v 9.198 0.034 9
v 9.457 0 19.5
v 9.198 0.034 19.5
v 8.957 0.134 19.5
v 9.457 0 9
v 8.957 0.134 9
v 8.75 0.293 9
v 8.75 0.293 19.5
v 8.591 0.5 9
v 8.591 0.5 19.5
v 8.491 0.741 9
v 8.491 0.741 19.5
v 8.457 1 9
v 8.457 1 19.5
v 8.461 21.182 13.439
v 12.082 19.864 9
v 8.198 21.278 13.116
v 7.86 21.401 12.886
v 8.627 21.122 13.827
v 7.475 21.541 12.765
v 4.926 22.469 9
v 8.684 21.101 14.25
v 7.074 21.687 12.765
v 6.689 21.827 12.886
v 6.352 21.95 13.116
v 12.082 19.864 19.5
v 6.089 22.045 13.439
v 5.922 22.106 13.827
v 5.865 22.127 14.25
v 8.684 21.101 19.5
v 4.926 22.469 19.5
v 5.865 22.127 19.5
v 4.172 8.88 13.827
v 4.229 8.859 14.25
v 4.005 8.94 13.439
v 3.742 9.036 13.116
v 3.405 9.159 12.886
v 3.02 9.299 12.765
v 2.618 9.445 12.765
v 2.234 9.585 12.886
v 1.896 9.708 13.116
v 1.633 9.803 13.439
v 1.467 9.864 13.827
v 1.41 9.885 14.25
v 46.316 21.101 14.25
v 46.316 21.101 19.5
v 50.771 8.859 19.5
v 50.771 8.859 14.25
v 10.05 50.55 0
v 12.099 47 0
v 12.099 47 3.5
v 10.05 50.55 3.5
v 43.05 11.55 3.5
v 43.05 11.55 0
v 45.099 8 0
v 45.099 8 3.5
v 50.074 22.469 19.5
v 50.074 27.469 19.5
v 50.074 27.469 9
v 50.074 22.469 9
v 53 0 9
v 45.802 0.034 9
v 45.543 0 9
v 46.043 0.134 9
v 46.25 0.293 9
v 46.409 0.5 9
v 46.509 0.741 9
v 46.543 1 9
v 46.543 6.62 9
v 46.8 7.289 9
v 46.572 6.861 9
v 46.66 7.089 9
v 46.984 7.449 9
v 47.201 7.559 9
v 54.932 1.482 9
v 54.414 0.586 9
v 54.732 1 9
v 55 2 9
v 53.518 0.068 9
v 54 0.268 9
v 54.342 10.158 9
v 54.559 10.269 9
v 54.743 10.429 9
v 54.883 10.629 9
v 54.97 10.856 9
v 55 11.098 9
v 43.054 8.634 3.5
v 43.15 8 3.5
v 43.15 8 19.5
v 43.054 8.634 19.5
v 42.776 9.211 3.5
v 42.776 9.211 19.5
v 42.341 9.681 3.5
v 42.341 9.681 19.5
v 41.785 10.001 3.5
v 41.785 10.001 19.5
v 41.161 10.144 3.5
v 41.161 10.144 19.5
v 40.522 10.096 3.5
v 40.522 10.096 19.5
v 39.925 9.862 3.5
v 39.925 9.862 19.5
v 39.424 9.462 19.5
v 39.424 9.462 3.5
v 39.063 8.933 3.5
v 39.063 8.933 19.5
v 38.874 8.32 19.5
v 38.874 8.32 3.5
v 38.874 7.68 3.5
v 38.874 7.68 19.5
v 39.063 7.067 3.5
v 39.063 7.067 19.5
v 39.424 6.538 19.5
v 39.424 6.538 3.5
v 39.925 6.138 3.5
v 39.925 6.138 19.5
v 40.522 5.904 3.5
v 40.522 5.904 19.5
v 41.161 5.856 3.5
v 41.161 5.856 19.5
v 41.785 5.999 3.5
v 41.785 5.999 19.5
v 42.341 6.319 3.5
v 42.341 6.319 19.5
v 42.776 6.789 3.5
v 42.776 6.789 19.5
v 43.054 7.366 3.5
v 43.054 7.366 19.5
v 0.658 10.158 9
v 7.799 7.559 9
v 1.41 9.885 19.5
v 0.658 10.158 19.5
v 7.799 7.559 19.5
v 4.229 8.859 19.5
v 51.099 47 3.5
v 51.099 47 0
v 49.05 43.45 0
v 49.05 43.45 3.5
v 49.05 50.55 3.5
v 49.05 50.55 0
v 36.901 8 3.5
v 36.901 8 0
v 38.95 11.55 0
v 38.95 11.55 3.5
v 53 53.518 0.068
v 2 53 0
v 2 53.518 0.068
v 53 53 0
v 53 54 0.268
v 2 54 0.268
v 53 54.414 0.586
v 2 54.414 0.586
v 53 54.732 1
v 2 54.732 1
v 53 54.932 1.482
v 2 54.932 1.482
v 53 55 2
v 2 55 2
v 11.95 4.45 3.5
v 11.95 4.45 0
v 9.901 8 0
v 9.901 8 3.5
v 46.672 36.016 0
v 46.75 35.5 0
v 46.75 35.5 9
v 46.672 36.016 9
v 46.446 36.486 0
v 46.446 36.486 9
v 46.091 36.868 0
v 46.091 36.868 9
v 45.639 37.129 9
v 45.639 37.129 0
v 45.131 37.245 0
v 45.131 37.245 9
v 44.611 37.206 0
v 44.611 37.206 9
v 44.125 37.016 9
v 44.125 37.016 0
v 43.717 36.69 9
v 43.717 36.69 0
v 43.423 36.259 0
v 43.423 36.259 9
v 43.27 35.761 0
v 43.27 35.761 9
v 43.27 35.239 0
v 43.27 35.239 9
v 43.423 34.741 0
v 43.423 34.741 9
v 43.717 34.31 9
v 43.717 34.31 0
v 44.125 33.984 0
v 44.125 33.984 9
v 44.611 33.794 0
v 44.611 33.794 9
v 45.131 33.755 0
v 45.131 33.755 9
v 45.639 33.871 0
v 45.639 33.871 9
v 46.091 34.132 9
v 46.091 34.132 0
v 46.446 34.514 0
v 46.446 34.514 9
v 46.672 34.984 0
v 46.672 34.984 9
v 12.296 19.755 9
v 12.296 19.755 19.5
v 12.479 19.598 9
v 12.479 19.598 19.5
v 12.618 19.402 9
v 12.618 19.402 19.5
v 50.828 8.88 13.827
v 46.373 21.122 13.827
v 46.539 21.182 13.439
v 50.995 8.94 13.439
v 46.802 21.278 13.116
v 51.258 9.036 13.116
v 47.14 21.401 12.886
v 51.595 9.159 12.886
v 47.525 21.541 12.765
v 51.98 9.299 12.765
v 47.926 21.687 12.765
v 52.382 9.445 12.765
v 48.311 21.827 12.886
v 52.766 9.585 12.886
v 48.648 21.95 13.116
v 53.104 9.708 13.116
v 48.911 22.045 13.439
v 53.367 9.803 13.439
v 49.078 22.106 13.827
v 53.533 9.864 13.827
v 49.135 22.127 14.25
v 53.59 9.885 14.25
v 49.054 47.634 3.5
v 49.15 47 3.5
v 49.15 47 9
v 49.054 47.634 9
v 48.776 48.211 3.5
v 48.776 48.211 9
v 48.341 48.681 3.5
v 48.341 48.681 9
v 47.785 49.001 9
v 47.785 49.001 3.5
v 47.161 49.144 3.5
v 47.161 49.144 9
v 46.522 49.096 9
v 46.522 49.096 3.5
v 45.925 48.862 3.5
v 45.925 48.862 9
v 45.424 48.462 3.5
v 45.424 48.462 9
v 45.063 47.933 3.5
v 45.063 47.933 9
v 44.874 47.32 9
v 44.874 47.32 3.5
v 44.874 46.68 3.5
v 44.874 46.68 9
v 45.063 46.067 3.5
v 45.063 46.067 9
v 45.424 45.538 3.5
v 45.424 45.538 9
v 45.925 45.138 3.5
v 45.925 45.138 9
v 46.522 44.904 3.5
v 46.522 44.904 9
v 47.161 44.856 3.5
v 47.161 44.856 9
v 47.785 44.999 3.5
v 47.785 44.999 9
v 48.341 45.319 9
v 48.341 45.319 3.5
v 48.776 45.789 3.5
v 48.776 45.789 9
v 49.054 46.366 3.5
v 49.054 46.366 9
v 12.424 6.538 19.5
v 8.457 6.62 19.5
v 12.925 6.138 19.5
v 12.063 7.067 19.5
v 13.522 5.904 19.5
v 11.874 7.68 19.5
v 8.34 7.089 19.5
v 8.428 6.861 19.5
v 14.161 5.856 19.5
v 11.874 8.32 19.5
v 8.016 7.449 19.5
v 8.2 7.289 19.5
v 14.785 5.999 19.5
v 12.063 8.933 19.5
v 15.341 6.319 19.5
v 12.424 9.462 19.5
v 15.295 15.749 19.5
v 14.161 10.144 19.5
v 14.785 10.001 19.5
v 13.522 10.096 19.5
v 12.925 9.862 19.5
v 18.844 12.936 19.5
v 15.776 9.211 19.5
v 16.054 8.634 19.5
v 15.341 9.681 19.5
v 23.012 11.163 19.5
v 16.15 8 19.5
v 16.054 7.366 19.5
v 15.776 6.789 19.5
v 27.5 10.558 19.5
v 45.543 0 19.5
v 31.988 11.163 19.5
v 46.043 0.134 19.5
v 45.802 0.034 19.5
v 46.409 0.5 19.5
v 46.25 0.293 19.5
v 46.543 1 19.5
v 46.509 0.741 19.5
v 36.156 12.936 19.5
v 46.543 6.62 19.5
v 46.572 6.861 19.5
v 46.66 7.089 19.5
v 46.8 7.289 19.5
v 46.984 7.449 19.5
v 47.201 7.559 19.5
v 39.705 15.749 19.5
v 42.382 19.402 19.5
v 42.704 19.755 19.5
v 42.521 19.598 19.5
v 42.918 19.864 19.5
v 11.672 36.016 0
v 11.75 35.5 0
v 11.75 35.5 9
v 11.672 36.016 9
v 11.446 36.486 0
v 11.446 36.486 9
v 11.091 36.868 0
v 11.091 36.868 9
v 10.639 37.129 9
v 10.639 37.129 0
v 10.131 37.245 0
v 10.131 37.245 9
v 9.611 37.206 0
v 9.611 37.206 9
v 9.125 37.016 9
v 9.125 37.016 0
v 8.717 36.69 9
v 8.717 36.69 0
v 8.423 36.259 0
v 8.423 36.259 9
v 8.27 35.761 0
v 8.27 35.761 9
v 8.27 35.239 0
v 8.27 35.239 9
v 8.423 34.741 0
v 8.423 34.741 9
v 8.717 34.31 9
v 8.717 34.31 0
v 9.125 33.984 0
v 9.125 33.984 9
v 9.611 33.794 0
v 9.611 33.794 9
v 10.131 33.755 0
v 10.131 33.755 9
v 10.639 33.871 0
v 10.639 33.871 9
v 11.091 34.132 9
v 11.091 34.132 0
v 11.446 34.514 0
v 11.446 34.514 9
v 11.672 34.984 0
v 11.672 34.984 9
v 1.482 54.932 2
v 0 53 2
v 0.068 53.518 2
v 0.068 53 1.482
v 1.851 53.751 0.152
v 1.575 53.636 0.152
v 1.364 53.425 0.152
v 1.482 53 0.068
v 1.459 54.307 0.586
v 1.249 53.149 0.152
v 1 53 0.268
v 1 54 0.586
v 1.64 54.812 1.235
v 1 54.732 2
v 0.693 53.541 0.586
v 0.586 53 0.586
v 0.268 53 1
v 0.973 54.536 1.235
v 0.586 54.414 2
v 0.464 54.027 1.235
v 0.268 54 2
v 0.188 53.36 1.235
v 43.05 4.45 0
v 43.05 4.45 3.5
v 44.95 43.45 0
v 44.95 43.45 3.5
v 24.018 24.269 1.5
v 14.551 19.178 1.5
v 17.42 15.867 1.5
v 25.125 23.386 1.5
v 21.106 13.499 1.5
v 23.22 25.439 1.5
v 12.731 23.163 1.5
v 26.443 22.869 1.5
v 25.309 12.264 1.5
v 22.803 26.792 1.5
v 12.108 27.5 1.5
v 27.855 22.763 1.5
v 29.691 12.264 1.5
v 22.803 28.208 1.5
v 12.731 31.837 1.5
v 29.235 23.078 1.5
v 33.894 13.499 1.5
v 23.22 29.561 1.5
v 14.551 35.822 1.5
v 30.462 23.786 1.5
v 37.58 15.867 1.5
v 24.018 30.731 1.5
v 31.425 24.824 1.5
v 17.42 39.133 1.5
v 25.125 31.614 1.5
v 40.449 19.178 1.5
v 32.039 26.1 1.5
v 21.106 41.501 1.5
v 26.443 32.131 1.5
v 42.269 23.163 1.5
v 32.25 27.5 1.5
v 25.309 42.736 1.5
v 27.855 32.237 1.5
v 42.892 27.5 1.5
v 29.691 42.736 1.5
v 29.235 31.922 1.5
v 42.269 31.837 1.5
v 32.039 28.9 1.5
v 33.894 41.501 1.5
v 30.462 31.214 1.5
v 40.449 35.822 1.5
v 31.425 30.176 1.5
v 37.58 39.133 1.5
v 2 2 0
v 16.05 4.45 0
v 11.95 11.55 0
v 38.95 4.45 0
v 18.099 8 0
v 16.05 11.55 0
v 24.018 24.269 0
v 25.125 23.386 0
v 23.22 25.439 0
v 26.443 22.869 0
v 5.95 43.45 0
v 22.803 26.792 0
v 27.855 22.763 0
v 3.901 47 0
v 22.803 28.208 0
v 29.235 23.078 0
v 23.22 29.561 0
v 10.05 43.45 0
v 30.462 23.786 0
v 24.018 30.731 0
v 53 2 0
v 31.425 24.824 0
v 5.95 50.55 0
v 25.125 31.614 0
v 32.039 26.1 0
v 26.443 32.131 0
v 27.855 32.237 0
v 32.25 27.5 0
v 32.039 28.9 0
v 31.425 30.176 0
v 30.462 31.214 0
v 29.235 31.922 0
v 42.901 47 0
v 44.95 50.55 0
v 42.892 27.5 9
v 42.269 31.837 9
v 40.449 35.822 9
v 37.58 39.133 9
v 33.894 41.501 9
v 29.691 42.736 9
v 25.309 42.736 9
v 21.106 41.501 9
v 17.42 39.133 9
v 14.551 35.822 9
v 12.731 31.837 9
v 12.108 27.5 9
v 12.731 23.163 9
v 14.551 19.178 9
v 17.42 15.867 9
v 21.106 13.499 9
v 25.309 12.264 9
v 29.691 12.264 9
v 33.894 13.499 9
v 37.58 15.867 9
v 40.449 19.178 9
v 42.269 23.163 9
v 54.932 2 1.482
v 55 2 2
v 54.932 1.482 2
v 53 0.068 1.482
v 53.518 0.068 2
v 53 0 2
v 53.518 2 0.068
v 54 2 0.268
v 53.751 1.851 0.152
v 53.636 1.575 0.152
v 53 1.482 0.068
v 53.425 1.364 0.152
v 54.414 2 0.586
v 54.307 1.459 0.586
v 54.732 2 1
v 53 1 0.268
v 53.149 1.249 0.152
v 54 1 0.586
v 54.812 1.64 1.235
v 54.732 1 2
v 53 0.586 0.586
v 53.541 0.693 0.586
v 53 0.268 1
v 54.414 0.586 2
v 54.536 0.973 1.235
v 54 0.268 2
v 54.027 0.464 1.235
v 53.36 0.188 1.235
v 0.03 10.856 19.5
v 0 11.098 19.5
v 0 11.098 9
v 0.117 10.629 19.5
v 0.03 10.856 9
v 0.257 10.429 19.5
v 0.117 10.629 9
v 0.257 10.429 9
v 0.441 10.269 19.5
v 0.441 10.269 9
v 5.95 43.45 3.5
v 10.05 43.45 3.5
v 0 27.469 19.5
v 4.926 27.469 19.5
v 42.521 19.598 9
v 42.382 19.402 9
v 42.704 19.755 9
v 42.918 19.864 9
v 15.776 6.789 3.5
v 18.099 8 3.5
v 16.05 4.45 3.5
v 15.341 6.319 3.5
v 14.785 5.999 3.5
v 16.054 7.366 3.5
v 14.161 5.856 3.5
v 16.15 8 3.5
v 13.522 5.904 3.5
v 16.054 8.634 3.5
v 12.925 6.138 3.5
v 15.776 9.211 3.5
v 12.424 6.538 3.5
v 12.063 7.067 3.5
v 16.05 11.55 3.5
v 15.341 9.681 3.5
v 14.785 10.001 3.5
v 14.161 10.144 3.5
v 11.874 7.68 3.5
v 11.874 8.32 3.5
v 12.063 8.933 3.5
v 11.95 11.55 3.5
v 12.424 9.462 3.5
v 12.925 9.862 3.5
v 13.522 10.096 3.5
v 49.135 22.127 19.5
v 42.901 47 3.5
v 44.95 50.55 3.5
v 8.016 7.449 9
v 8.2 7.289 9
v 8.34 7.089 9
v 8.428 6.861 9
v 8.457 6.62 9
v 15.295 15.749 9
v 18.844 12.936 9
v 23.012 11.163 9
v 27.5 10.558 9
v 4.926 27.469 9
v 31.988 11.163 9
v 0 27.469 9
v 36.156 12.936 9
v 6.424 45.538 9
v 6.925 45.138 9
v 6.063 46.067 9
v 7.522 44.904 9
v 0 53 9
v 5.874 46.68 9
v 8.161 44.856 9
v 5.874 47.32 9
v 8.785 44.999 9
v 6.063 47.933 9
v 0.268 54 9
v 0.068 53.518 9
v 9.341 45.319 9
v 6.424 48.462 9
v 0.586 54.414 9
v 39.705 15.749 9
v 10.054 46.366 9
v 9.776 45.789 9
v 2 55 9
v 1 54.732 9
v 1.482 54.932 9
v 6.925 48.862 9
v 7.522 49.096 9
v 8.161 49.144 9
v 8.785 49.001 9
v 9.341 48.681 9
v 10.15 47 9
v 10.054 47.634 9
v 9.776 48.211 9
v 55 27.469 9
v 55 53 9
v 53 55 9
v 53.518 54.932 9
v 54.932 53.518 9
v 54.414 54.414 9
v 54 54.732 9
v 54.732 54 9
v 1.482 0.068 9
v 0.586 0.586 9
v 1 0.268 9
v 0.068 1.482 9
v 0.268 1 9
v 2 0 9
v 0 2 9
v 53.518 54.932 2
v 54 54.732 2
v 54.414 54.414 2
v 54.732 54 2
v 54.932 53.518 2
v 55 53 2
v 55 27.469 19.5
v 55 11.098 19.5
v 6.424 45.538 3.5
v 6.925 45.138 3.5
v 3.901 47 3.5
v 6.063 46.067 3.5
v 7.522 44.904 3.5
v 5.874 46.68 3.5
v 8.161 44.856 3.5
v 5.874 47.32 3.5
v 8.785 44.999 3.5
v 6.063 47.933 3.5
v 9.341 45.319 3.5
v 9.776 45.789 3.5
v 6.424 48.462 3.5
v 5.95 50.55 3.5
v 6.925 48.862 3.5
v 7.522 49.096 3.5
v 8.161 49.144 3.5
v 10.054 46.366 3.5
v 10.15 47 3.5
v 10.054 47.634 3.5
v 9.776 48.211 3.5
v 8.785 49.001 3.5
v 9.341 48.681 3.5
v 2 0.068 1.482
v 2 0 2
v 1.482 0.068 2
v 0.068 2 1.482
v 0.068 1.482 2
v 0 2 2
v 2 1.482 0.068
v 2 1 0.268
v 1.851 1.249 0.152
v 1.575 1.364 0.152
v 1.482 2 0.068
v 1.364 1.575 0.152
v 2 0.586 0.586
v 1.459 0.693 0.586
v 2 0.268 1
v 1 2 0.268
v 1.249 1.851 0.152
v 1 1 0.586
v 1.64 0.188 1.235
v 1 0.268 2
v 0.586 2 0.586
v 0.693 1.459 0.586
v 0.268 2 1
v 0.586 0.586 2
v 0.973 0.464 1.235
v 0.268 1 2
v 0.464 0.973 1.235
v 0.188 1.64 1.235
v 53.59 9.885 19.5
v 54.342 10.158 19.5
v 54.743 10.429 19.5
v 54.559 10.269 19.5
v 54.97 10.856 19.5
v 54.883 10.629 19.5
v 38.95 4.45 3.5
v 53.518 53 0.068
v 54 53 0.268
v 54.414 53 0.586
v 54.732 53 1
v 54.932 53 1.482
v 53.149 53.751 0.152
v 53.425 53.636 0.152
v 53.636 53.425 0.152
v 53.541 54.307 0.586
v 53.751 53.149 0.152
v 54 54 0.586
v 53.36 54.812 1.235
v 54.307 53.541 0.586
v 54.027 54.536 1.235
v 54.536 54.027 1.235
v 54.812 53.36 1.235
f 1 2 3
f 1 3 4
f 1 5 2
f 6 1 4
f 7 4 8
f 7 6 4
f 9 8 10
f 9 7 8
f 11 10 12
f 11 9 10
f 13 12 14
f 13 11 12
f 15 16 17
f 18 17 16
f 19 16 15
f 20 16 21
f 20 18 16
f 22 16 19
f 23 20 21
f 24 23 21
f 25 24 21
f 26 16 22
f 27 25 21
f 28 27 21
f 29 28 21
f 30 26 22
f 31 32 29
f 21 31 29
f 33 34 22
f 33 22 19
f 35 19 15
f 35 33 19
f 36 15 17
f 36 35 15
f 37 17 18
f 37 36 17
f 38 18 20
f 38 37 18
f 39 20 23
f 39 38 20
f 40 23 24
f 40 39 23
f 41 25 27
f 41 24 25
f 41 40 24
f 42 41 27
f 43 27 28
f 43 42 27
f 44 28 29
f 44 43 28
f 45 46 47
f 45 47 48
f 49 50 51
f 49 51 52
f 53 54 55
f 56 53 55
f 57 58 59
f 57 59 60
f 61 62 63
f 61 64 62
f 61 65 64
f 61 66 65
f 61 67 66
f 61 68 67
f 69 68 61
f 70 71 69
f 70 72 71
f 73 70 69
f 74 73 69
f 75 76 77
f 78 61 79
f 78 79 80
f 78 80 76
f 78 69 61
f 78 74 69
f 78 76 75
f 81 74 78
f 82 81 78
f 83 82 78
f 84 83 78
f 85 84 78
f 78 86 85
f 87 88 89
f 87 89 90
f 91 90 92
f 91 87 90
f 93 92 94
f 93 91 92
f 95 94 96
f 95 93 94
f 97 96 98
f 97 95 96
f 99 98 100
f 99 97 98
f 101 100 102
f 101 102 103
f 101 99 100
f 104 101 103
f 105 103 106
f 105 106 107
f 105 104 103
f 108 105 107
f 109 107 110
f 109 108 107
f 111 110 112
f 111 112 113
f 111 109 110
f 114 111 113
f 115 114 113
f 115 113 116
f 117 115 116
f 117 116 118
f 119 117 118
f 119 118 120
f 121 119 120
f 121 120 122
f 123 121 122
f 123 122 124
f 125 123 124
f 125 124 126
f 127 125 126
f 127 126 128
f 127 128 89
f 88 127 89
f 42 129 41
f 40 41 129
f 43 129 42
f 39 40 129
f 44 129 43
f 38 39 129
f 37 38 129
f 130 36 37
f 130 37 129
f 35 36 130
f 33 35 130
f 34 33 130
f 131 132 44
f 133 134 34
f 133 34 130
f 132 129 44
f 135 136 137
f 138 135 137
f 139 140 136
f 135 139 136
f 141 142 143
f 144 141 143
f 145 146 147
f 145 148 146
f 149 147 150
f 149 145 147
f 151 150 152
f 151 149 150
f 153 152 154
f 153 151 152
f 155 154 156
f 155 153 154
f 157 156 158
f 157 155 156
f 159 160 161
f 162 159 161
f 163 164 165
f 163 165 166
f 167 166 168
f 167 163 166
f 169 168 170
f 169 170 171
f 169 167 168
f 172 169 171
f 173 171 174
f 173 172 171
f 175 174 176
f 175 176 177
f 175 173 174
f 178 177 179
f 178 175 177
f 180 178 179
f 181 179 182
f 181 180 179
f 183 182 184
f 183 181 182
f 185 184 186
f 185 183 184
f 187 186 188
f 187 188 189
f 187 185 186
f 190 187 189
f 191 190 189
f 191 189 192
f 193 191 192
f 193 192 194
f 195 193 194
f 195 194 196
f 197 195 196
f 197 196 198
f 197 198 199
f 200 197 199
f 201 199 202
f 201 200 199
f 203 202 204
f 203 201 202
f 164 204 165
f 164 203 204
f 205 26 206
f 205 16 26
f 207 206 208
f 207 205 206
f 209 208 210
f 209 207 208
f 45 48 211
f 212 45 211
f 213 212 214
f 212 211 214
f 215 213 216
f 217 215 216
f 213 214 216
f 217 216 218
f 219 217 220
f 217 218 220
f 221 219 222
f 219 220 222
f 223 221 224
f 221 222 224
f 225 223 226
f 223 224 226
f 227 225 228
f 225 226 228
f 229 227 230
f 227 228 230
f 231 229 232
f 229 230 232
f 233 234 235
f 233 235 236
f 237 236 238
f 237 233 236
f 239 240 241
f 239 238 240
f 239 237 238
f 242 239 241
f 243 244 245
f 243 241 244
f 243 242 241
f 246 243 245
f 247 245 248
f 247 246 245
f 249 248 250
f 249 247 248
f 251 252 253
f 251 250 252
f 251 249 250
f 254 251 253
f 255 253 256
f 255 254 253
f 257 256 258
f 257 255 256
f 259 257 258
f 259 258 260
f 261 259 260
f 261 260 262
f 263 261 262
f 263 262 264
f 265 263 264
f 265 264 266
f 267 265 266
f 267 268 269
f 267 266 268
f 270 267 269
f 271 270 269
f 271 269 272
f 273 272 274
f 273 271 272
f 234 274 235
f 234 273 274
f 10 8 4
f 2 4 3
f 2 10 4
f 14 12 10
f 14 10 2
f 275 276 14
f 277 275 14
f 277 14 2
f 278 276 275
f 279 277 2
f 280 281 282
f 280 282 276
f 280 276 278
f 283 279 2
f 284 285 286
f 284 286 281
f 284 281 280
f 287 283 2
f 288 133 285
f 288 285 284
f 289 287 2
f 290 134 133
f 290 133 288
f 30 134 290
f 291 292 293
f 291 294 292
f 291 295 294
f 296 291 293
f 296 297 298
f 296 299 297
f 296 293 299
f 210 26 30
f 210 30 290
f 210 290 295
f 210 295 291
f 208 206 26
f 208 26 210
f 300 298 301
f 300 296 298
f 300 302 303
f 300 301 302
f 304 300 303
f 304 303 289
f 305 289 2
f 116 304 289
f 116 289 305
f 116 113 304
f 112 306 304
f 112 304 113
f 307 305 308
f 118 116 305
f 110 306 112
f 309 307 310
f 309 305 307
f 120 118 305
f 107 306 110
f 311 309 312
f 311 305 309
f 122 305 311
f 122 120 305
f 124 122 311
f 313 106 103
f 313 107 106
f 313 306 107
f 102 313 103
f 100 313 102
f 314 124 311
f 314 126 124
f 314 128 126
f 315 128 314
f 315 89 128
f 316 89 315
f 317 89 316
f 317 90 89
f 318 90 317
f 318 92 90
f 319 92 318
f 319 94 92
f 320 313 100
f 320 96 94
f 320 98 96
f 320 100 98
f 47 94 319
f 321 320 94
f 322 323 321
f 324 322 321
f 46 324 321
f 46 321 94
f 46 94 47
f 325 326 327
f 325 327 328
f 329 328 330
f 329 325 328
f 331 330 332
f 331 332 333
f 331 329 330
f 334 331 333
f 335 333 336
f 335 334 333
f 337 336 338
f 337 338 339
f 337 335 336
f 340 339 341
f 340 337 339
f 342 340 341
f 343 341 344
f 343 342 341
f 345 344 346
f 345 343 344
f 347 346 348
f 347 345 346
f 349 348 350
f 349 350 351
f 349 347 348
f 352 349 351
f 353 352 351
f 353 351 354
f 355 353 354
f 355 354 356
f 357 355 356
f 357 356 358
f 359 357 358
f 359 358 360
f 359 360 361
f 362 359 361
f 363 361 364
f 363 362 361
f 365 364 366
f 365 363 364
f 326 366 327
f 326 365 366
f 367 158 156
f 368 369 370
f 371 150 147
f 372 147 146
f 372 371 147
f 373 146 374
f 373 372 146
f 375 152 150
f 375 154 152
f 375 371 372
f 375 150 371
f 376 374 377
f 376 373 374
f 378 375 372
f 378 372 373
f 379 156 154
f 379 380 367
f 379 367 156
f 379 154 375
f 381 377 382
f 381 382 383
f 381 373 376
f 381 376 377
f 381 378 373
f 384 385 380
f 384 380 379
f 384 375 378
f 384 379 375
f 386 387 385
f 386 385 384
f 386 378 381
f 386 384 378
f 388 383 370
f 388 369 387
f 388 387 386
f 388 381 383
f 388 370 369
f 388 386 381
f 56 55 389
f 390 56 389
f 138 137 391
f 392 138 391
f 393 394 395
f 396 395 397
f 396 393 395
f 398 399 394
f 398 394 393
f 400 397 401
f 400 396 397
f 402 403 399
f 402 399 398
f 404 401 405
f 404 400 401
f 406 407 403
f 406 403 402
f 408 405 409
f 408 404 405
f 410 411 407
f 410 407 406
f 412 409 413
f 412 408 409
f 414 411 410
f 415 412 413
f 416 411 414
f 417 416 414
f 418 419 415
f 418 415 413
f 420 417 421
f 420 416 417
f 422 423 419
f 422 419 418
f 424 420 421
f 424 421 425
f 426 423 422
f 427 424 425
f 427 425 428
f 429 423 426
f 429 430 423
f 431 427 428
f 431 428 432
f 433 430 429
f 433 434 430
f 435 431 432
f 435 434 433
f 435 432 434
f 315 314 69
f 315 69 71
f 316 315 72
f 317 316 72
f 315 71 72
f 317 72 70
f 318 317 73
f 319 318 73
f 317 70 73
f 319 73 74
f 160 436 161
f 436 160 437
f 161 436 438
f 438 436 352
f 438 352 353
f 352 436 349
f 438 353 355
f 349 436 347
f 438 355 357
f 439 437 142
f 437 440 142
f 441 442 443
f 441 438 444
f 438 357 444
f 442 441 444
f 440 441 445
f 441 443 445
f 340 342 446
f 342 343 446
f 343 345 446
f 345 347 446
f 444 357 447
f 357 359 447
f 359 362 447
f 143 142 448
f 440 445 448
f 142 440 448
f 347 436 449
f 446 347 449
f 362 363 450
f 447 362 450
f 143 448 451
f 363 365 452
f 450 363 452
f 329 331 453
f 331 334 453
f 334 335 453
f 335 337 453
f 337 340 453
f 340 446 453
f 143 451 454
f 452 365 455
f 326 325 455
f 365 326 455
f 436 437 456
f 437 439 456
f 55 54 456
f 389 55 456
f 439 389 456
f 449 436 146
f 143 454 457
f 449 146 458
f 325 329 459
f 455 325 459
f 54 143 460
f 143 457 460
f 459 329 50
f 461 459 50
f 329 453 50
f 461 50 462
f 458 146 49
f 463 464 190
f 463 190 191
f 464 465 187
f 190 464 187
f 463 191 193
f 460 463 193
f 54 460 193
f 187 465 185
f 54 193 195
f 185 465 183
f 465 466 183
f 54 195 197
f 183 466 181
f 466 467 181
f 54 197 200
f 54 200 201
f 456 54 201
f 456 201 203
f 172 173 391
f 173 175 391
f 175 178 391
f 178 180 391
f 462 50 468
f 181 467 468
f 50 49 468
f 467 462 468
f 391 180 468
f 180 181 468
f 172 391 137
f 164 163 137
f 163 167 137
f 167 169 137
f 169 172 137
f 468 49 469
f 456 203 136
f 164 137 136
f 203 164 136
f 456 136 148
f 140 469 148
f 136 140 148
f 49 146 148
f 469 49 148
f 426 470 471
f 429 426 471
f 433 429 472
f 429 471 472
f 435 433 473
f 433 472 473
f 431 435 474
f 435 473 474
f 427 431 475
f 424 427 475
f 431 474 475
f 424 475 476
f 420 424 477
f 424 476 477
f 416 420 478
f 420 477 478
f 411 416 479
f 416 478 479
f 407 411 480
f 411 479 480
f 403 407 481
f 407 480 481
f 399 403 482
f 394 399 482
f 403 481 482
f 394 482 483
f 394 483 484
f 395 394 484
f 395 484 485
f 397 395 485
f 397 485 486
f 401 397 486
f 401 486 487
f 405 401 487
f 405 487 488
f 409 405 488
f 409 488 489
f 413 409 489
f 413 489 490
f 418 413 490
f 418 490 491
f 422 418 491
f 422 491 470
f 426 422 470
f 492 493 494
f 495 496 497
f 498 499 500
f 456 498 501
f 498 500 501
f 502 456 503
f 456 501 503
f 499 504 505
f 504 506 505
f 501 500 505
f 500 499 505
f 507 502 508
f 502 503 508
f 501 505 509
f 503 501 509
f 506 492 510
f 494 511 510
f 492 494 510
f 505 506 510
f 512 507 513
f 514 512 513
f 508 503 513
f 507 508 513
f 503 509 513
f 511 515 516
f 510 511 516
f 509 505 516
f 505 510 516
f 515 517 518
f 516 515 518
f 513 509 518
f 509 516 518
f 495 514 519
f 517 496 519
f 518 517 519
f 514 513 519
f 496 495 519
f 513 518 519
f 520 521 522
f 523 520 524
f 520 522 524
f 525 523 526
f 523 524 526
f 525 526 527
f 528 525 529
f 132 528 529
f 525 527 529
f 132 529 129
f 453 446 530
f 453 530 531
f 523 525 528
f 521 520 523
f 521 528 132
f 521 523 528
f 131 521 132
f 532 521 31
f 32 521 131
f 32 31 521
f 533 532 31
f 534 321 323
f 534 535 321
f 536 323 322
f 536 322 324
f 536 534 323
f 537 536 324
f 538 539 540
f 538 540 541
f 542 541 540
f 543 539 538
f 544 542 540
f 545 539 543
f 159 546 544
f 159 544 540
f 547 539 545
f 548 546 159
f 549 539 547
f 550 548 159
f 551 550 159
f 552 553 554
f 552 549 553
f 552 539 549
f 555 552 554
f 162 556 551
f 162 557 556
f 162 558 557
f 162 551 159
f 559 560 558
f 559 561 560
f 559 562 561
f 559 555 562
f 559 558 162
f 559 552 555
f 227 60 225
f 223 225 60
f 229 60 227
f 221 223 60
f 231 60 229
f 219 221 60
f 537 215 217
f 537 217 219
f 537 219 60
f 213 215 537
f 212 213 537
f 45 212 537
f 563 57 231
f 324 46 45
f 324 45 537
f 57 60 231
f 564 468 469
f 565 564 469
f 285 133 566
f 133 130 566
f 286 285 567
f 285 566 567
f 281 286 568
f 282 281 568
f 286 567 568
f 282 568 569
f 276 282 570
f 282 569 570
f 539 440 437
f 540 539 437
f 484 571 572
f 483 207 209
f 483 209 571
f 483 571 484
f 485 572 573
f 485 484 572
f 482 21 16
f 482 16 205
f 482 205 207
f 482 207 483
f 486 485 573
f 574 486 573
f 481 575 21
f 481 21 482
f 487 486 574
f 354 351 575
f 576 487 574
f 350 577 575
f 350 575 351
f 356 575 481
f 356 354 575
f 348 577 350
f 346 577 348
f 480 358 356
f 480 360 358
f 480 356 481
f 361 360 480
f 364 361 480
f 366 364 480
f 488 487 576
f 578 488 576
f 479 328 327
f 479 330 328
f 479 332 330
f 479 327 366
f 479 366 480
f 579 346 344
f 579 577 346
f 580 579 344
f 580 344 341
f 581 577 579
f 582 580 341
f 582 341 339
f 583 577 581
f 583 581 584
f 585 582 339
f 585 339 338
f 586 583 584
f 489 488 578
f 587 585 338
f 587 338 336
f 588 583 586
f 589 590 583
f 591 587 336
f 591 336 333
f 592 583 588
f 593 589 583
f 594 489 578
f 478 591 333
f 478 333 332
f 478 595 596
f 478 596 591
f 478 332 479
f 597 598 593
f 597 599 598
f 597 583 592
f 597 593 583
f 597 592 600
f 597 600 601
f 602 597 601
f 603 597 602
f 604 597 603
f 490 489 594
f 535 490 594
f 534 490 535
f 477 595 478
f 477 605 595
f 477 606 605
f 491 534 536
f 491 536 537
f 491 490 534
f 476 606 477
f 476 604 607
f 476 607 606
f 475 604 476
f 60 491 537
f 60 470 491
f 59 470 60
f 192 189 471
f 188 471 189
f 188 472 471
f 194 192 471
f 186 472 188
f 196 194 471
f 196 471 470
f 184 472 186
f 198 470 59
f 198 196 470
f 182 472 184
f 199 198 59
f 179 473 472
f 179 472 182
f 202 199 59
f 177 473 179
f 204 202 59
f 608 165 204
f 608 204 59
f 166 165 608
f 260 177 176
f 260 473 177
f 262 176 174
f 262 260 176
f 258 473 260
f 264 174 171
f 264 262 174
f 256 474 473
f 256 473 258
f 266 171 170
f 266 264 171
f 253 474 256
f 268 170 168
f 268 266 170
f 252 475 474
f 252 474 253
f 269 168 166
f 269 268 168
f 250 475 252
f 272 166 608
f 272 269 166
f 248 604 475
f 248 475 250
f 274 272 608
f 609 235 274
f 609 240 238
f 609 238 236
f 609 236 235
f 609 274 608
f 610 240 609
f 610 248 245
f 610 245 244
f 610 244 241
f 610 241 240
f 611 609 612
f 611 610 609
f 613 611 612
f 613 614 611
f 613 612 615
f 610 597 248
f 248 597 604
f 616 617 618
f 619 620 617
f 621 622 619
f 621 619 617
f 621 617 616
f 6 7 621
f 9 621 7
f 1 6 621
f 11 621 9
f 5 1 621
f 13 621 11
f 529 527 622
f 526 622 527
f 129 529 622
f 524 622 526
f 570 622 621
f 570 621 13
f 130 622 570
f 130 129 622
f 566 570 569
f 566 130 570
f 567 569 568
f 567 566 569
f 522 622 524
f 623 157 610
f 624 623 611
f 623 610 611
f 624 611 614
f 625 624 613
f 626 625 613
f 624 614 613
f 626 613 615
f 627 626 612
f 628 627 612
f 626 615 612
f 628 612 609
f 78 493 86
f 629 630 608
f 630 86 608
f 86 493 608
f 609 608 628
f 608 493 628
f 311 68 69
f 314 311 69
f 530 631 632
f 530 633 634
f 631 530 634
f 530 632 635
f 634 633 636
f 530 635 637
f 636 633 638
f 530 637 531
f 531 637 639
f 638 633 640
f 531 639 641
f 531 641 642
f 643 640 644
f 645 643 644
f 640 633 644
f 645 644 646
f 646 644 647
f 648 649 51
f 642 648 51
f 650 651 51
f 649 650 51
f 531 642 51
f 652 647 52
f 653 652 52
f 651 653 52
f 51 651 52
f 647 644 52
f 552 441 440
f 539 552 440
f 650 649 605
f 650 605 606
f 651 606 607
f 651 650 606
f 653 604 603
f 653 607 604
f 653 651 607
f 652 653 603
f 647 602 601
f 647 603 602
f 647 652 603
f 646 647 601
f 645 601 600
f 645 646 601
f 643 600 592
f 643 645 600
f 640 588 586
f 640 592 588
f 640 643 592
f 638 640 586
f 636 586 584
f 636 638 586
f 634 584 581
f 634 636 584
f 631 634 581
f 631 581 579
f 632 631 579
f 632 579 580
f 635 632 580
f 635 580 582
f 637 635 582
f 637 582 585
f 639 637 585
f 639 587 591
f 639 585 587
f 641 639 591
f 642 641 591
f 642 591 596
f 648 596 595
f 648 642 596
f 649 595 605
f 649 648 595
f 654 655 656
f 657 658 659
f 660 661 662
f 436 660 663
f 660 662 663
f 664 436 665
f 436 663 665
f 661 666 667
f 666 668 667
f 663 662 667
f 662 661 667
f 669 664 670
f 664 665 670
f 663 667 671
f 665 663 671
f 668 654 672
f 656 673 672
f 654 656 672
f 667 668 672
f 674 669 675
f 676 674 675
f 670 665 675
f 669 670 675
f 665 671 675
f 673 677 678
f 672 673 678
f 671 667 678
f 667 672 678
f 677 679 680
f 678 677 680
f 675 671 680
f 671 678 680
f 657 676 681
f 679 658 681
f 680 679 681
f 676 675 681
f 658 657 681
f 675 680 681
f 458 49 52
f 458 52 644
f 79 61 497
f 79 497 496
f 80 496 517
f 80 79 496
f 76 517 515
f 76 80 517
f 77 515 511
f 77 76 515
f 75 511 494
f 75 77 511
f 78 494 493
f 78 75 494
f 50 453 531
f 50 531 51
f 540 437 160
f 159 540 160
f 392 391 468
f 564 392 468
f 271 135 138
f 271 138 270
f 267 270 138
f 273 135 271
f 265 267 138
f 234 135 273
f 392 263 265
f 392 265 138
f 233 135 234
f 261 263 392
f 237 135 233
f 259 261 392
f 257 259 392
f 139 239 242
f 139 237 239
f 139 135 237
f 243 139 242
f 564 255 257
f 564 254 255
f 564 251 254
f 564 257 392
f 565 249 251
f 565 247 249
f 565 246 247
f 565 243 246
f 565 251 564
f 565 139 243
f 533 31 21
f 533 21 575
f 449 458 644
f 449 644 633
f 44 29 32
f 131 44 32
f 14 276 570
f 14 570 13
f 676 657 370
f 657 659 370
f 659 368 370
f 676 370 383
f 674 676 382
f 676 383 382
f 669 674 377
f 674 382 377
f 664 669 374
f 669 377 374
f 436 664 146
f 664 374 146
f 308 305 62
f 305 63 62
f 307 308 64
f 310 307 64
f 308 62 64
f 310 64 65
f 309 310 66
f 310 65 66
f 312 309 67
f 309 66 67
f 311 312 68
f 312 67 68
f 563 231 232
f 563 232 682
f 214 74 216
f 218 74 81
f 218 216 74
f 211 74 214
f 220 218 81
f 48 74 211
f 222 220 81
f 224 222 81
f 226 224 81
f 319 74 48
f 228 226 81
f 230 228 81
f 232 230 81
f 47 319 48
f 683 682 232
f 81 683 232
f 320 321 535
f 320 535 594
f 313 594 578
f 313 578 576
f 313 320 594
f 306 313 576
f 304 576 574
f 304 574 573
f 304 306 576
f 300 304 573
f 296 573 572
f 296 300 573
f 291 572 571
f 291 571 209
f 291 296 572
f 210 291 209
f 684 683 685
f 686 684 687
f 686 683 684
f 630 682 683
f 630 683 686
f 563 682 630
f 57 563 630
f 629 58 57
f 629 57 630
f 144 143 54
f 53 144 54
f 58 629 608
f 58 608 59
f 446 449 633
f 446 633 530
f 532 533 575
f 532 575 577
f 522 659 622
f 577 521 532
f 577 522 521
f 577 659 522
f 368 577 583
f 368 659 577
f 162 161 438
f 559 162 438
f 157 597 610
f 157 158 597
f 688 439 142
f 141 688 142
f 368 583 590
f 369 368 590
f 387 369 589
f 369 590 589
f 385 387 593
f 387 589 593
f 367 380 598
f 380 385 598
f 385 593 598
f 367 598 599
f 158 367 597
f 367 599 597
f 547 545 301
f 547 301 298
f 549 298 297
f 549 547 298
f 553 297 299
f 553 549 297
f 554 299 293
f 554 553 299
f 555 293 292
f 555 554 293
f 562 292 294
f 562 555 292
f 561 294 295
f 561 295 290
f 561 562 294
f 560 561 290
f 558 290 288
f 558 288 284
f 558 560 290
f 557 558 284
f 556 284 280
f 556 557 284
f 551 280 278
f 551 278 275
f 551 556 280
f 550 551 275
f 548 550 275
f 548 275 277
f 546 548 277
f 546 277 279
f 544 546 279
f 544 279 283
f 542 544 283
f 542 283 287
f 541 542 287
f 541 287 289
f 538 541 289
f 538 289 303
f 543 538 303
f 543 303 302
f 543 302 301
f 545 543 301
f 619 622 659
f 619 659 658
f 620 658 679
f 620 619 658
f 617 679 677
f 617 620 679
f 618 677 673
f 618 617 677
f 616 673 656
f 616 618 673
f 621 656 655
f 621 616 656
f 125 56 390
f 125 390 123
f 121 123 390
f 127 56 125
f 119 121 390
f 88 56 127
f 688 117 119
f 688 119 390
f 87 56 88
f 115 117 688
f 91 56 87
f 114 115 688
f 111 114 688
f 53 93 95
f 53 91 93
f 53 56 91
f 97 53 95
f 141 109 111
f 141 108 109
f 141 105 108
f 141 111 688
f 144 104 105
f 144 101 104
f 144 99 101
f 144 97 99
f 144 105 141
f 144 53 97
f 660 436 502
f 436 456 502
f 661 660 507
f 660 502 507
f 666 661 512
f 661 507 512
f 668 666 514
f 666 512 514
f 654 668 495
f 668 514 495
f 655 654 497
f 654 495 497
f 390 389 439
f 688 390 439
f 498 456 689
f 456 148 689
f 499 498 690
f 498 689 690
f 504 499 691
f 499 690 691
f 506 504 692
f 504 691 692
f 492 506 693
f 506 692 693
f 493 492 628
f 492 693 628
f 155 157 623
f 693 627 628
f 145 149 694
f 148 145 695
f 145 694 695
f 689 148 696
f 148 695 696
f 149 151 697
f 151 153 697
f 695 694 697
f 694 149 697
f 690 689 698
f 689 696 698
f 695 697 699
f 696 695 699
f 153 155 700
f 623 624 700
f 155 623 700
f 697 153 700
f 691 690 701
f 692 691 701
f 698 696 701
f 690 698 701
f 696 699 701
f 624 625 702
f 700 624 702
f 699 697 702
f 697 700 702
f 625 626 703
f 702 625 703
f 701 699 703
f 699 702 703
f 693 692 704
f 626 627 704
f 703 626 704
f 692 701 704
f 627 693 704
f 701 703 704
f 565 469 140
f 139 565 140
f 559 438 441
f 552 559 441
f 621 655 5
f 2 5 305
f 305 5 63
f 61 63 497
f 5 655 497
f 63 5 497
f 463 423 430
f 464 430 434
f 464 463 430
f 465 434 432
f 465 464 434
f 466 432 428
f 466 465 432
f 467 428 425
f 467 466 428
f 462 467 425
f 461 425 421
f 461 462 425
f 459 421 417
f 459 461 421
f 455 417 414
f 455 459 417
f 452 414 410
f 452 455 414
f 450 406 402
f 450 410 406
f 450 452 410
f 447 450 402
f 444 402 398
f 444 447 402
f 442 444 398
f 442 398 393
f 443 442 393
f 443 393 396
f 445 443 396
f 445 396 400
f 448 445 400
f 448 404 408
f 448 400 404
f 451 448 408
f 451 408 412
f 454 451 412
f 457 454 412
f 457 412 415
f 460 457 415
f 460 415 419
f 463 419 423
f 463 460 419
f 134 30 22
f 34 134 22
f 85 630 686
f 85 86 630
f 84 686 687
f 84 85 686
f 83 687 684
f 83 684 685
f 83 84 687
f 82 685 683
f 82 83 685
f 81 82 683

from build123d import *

# Parameters (mm, degrees)
SKETCH1_W           = 55
SKETCH1_H           = 55
SKETCH1_R           = 4.75
SKETCH1_R_2         = 2.15
BOSS_EXTRUDE1_DEPTH = 19.5
CUT_EXTRUDE10_DEPTH = 3.5
SKETCH5_R           = 15.392304845
CUT_EXTRUDE2_DEPTH  = 18
SKETCH6_OUTSIDE_W   = 73.038
SKETCH6_OUTSIDE_H   = 73.038
CUT_EXTRUDE3_DEPTH  = 10.5
SKETCH7_R           = 1.75
CUT_EXTRUDE4_DEPTH  = 9
CUT_EXTRUDE6_REACH  = 73.751
CUT_EXTRUDE11_REACH = 86.299
FILLET2_R           = 2
FILLET3_R           = 1


with BuildPart() as part:
    # Sketch1 → Boss-Extrude1 (new body)
    with BuildSketch(Plane.XY):
        with Locations((27.5, 27.5)):
            Rectangle(SKETCH1_W, SKETCH1_H)
        with Locations((27.5, 27.5)):
            Circle(SKETCH1_R, mode=Mode.SUBTRACT)
        with Locations((8, 47)):
            Circle(SKETCH1_R_2, mode=Mode.SUBTRACT)
        with Locations((47, 47)):
            Circle(SKETCH1_R_2, mode=Mode.SUBTRACT)
        with Locations((41, 8)):
            Circle(SKETCH1_R_2, mode=Mode.SUBTRACT)
        with Locations((14, 8)):
            Circle(SKETCH1_R_2, mode=Mode.SUBTRACT)
    extrude(amount=BOSS_EXTRUDE1_DEPTH)

    # Sketch11 → Cut-Extrude10 (cut)
    with BuildSketch(Plane.XY):
        Polygon((10.049593456, 50.55), (5.950406544, 50.55), (3.900813089, 47), (5.950406544, 43.45), (10.049593456, 43.45), (12.099186911, 47), align=None)
        Polygon((42.900813089, 47), (44.950406544, 50.55), (49.049593456, 50.55), (51.099186911, 47), (49.049593456, 43.45), (44.950406544, 43.45), align=None)
        Polygon((38.950406544, 11.55), (43.049593456, 11.55), (45.099186911, 8), (43.049593456, 4.45), (38.950406544, 4.45), (36.900813089, 8), align=None)
        Polygon((11.950406544, 11.55), (16.049593456, 11.55), (18.099186911, 8), (16.049593456, 4.45), (11.950406544, 4.45), (9.900813089, 8), align=None)
    extrude(amount=CUT_EXTRUDE10_DEPTH, mode=Mode.SUBTRACT)

    # Sketch5 → Cut-Extrude2 (cut)
    with BuildSketch(Plane.XY.offset(19.5)):
        with Locations((27.5, 27.5)):
            Circle(SKETCH5_R)
    extrude(amount=-CUT_EXTRUDE2_DEPTH, mode=Mode.SUBTRACT)

    # Sketch6 outside → Cut-Extrude3 (cut)
    with BuildSketch(Plane.XY.offset(19.5)):
        with Locations((27.5, 27.5)):
            Rectangle(SKETCH6_OUTSIDE_W, SKETCH6_OUTSIDE_H)
        with BuildLine():
            Line((12.44308051, 19.732705171), (4.925539544, 22.468866318))
            Line((4.925539544, 22.468866318), (4.925539544, 27.468866318))
            Line((4.925539544, 27.468866318), (0, 27.468866318))
            Line((0, 27.468866318), (0, 10.397959841))
            Line((0, 10.397959841), (8.457233587, 7.319778551))
            Line((8.457233587, 7.319778551), (8.457233587, 0))
            Line((8.457233587, 0), (46.542766413, 0))
            Line((46.542766413, 0), (46.542766413, 7.319778551))
            Line((46.542766413, 7.319778551), (55, 10.397959841))
            Line((55, 10.397959841), (55, 27.468866318))
            Line((55, 27.468866318), (50.074460456, 27.468866318))
            Line((50.074460456, 27.468866318), (50.074460456, 22.468866318))
            Line((50.074460456, 22.468866318), (42.55691949, 19.732705171))
            ThreePointArc((42.55691949, 19.732705171), (27.5, 10.557695155), (12.44308051, 19.732705171))
        make_face(mode=Mode.SUBTRACT)
    extrude(amount=-CUT_EXTRUDE3_DEPTH, mode=Mode.SUBTRACT)

    # Sketch7 → Cut-Extrude4 (cut)
    with BuildSketch(Plane.XY):
        with Locations((10, 35.5)):
            Circle(SKETCH7_R)
        with Locations((45, 35.5)):
            Circle(SKETCH7_R)
    extrude(amount=CUT_EXTRUDE4_DEPTH, mode=Mode.SUBTRACT)

    # Sketch9 → Cut-Extrude6 (cut, up to next)
    with BuildSketch(Plane(origin=(3.341839876, 9.181629599, 0), x_dir=(0, 0, 1), z_dir=(-0.3420201433256653, -0.9396926207859098, 0)), mode=Mode.PRIVATE) as cut_extrude6_sk1:
        with BuildLine():
            Line((14.25, 2.056311715), (19.5, 2.056311715))
            Line((19.5, 2.056311715), (19.5, -0.943688285))
            Line((19.5, -0.943688285), (14.25, -0.943688285))
            ThreePointArc((14.25, -0.943688285), (12.75, 0.556311715), (14.25, 2.056311715))
        make_face()
    cut_extrude6_tool1 = extrude(cut_extrude6_sk1.sketch, amount=-CUT_EXTRUDE6_REACH, mode=Mode.PRIVATE) & part.part
    add(cut_extrude6_tool1.solids().sort_by_distance((2.819078, 9.371899, 16.277233))[0], mode=Mode.SUBTRACT)

    # Sketch10 → Cut-Extrude11 (cut, up to next)
    with BuildSketch(Plane(origin=(3.091937938, -8.495029668, 0), x_dir=(0, 0, -1), z_dir=(0.3420201433256654, -0.9396926207859098, 0)), mode=Mode.PRIVATE) as cut_extrude11_sk1:
        with BuildLine():
            Line((-14.25, 53.739405858), (-19.5, 53.739405858))
            Line((-19.5, 53.739405858), (-19.5, 50.739405858))
            Line((-19.5, 50.739405858), (-14.25, 50.739405858))
            ThreePointArc((-14.25, 50.739405858), (-12.75, 52.239405858), (-14.25, 53.739405858))
        make_face()
    cut_extrude11_tool1 = extrude(cut_extrude11_sk1.sketch, amount=-CUT_EXTRUDE11_REACH, mode=Mode.PRIVATE) & part.part
    add(cut_extrude11_tool1.solids().sort_by_distance((52.180922, 9.371899, 16.277233))[0], mode=Mode.SUBTRACT)

    # Fillet2
    fillet2_edges = [part.edges().sort_by_distance(p)[0] for p in [
        (0, 55, 4.5),
        (55, 55, 4.5),
        (55, 0, 4.5),
        (0, 0, 4.5),
        (27.5, 55, 0),
        (55, 27.5, 0),
        (27.5, 0, 0),
        (0, 27.5, 0),
    ]]
    fillet(fillet2_edges, radius=FILLET2_R)

    # Fillet3
    fillet3_edges = [part.edges().sort_by_distance(p)[0] for p in [
        (0, 10.397959841, 14.25),
        (12.44308051, 19.732705171, 14.25),
        (42.55691949, 19.732705171, 14.25),
        (55, 10.397959841, 14.25),
        (46.542766413, 7.319778551, 14.25),
        (46.542766413, 0, 14.25),
        (8.457233587, 0, 14.25),
        (8.457233587, 7.319778551, 14.25),
    ]]
    fillet(fillet3_edges, radius=FILLET3_R)


solid = part.part
